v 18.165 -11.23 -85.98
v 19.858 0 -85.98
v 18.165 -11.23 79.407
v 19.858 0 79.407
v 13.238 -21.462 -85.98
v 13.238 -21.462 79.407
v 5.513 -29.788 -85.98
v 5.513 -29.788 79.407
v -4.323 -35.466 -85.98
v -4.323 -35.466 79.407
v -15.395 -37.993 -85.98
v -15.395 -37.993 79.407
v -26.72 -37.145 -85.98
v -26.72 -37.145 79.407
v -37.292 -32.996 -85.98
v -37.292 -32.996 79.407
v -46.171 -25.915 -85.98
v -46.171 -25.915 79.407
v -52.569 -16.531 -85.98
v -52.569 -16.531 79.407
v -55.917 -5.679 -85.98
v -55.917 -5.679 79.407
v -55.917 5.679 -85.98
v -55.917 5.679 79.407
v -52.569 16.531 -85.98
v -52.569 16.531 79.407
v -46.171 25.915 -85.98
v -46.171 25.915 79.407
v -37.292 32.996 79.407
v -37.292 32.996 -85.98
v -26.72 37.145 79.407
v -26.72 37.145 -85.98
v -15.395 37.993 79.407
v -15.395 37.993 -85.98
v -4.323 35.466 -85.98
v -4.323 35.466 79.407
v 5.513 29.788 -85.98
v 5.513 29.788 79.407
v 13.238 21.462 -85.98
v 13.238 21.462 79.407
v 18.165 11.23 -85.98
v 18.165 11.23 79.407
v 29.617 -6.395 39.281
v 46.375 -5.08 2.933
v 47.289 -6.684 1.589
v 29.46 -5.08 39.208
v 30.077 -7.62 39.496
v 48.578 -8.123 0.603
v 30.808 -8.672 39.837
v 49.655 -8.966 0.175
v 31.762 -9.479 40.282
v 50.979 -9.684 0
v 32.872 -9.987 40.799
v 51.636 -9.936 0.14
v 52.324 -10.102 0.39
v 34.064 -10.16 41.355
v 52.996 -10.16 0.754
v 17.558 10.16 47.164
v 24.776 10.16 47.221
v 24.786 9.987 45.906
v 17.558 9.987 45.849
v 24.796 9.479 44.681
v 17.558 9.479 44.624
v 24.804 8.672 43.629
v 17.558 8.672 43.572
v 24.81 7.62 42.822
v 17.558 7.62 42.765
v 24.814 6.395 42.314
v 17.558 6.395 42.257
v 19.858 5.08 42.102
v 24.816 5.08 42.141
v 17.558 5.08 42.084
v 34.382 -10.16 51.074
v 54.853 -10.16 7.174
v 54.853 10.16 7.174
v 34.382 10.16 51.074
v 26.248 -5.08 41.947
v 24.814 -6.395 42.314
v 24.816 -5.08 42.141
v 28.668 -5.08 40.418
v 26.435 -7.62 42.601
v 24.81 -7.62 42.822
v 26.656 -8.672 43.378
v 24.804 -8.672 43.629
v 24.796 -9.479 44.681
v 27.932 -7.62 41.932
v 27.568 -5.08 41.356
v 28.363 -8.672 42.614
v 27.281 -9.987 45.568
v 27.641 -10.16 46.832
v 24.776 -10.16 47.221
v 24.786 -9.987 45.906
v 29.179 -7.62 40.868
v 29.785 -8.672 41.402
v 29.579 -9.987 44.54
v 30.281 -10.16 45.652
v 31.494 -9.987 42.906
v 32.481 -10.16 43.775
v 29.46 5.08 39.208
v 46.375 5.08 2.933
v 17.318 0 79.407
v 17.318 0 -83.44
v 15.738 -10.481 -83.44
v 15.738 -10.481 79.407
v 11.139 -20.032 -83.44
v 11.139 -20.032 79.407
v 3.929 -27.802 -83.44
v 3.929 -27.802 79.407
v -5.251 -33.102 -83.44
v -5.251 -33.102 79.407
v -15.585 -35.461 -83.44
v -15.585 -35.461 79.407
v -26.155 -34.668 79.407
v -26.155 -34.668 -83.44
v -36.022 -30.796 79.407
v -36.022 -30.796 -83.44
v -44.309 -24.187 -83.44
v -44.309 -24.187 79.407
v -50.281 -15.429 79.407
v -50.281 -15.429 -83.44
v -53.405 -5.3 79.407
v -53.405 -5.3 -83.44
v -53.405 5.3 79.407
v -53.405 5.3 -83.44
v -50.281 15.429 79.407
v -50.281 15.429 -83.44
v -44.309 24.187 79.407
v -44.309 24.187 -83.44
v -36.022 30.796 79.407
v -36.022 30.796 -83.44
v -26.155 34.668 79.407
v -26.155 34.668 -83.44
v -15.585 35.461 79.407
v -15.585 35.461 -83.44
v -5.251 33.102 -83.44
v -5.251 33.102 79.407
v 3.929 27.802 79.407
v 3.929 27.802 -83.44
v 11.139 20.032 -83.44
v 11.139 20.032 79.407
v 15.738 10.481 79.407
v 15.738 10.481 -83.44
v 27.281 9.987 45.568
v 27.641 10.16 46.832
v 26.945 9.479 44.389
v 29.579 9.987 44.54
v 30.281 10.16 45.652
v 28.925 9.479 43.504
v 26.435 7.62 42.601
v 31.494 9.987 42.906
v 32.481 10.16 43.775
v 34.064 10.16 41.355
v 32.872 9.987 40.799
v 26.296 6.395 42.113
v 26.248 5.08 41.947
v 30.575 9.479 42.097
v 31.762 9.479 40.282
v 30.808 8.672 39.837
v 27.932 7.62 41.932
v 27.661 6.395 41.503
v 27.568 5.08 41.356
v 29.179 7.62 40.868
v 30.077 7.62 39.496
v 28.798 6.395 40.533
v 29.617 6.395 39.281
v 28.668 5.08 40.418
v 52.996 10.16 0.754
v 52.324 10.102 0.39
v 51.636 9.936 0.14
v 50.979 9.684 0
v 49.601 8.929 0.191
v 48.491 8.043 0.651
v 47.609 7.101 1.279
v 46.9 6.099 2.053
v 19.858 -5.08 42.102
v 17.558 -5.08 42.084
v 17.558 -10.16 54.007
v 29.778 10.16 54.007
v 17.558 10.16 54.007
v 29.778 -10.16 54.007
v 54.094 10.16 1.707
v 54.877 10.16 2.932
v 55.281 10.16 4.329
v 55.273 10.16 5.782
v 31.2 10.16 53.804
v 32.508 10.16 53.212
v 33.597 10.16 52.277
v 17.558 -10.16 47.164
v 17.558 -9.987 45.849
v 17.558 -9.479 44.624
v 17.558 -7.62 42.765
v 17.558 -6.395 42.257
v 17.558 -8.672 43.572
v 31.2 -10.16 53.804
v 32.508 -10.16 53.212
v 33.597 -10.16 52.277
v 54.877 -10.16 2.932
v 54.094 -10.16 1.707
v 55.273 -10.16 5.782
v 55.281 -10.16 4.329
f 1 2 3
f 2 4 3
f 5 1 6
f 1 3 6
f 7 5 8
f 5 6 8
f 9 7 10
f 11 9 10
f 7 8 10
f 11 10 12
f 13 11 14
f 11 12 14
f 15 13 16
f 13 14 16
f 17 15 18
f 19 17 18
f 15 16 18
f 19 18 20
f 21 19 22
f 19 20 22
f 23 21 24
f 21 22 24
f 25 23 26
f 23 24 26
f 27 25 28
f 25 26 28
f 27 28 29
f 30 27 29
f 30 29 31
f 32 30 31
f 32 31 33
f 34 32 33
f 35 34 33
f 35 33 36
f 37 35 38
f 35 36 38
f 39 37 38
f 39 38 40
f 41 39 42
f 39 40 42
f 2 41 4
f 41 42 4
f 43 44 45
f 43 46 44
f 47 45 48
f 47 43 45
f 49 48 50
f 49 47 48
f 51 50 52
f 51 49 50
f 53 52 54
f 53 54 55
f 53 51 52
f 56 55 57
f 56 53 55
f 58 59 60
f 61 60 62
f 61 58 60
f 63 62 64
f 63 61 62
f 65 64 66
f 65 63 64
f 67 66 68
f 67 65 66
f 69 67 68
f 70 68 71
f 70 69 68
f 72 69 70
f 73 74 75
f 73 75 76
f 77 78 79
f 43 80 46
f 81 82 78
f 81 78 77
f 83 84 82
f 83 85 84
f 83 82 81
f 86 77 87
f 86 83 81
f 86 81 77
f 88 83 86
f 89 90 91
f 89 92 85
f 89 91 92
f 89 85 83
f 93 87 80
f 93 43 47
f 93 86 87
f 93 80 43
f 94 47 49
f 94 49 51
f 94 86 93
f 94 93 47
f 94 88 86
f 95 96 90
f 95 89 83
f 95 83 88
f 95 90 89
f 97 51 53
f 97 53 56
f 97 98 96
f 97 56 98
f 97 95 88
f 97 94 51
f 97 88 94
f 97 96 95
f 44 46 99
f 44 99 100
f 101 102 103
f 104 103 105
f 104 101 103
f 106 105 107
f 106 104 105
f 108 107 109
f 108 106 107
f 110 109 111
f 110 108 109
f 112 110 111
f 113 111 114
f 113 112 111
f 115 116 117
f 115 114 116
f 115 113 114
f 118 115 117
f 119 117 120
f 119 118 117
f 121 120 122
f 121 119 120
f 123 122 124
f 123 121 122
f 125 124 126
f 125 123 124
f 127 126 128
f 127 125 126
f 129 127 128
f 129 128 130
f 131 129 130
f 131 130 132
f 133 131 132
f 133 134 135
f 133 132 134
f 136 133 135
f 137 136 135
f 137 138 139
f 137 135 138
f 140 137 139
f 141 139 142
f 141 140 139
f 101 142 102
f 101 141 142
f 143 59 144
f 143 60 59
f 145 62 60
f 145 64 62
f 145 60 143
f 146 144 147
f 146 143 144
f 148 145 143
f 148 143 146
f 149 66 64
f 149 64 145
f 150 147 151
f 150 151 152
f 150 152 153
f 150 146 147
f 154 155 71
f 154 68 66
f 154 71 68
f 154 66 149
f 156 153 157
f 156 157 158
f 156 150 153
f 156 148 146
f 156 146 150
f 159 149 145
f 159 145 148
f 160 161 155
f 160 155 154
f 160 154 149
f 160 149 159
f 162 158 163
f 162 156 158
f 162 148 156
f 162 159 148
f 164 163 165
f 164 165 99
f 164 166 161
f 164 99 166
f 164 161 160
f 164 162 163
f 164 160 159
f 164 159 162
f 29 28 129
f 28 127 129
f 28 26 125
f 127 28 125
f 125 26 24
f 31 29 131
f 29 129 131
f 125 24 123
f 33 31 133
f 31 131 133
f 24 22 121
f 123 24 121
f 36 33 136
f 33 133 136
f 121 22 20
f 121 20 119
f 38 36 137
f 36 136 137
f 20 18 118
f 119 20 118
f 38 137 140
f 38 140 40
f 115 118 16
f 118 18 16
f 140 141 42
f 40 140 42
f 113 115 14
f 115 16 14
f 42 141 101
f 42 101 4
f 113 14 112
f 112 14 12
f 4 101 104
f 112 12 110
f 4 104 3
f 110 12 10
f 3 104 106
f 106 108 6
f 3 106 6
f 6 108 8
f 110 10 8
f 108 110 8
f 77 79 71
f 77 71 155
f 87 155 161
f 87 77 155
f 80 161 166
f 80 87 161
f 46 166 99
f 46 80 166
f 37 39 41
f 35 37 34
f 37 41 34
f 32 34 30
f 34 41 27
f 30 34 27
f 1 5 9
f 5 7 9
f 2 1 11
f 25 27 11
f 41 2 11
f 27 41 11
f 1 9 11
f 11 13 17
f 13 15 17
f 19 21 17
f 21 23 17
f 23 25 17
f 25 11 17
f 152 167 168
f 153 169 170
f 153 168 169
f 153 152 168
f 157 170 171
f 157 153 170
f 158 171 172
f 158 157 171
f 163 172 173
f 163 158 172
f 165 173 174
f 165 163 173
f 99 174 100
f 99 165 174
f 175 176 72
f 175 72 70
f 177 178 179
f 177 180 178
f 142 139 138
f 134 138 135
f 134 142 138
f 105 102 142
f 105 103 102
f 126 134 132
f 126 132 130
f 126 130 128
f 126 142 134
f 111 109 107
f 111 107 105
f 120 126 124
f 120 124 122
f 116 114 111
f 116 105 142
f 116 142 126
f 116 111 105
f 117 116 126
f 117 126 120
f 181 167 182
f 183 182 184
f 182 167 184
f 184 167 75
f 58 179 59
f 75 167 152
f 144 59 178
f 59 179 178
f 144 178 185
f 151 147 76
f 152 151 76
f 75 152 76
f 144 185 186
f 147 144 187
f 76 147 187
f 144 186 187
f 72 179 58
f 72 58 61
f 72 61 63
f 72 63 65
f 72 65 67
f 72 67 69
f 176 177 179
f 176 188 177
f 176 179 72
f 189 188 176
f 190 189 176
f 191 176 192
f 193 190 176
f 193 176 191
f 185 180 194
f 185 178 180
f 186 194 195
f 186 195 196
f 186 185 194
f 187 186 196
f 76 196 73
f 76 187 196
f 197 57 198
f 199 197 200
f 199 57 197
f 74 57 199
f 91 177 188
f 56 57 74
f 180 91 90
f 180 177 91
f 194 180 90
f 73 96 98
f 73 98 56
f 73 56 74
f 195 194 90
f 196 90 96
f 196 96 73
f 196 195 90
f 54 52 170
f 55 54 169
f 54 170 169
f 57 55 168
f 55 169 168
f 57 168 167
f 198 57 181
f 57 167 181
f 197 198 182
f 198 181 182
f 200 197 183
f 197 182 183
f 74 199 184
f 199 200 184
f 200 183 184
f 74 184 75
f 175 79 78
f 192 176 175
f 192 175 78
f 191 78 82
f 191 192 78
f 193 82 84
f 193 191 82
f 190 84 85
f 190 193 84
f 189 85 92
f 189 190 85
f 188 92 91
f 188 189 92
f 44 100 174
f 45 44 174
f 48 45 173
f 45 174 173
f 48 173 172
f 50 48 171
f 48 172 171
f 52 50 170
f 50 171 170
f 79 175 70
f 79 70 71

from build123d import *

# Parameters (mm, degrees)
F2_DEPTH    = 10.16
F3_R        = 5.08
F4_T        = -2.54
F5_R        = 5.08
F6_R        = 5.08
F7_T1_DEPTH = 59.8990400144
F9_T1_DEPTH = 52.7251544051
F9_T3_DEPTH = 19.9575926883
F9_T6_ANGLE = 65.45
F9_T8_ANGLE = 65.45


# Not quite as in the source:
# - a fillet or chamfer that OpenCascade refuses, or shapes differently, is made with other operations: its cross-section is extruded or revolved along the edge and cut away or added
# - a feature of the source that left no trace in its solid (it failed there, or was rolled back) is left out


with BuildPart() as f1:
    # F0 (on Front) → F1 (revolve)
    with BuildSketch(Plane.XZ):
        Polygon((19.8578521456, 79.4071055293), (-18.2421478544, 79.4071055293), (-18.2421478544, -85.9799182087), (19.8578521456, -85.9799182087), (19.8578521456, 42.1022108057), (17.5583876607, 42.0841504825), (17.5583876607, 54.0071055293), (19.8578521456, 54.0071055293), align=None)
        Polygon((19.8578521456, 42.1022108057), (19.8578521456, 54.0071055293), (17.5583876607, 54.0071055293), (17.5583876607, 42.0841504825), align=None)
    revolve(axis=Axis((-18.2421478544, 0, -3.2864063397), (0, 0, -1)))

    # F4
    f4_openings = [f1.faces().sort_by_distance(p)[0] for p in [
        (-18.242148, 0, 79.407106),
    ]]
    offset(amount=F4_T, openings=f4_openings)


with BuildPart() as f2:
    # F0 (on Front) → F2 (new body, symmetric)
    with BuildSketch(Plane.XZ):
        Polygon((33.0144607576, 54.0071055293), (19.8578521456, 54.0071055293), (19.8578521456, 42.1022108057), (28.0800888653, 42.1667894297), (47.7427856962, 0), (58.1983876607, 0), align=None)
        Polygon((19.8578521456, 42.1022108057), (19.8578521456, 54.0071055293), (17.5583876607, 54.0071055293), (17.5583876607, 42.0841504825), align=None)
    extrude(amount=F2_DEPTH, both=True)

    # F3
    f3_edges = [f2.edges().sort_by_distance(p)[0] for p in [
        (33.014461, 0, 54.007106),
    ]]
    fillet(f3_edges, radius=F3_R)

    # F5
    f5_edges = [f2.edges().sort_by_distance(p)[0] for p in [
        (28.080089, 0, 42.166789),
    ]]
    fillet(f5_edges, radius=F5_R)

    # F6
    f6_edges = [f2.edges().sort_by_distance(p)[0] for p in [
        (47.742786, 0, 0),
    ]]
    fillet(f6_edges, radius=F6_R)

    # F7: fillet of radius 5.08 on 1 edges, made by hand

    # F7_s2 → F7_t1 (cut)
    with BuildSketch(Plane.XZ.offset(-29.9495200072)):
        with BuildLine():
            ThreePointArc((50.9791026211, 0), (54.7189312044, 2.6135617341), (54.8530226422, 7.1741584337))
            Line((54.8530226422, 7.1741584337), (58.1983876607, 0))
            Line((58.1983876607, 0), (50.9791026211, 0))
        make_face()
    extrude(amount=F7_T1_DEPTH, mode=Mode.SUBTRACT)

    # F9: fillet of radius 5.08 on 6 edges, made by hand

    # F9_s2 → F9_t1 (cut)
    with BuildSketch(Plane(origin=(-9.7559305144, 0, 20.9216605042), x_dir=(0, 1, 0), z_dir=(0.4226182617, 0, -0.906307787))):
        with BuildLine():
            ThreePointArc((10.16, 48.3496584513), (8.6721024484, 44.7575560028), (5.08, 43.2696584513))
            Line((5.08, 43.2696584513), (10.16, 43.2696584513))
            Line((10.16, 43.2696584513), (10.16, 48.3496584513))
        make_face()
        with BuildLine():
            ThreePointArc((-5.08, 43.2696584513), (-8.6721024484, 44.7575560028), (-10.16, 48.3496584513))
            Line((-10.16, 48.3496584513), (-10.16, 43.2696584513))
            Line((-10.16, 43.2696584513), (-5.08, 43.2696584513))
        make_face()
    extrude(amount=F9_T1_DEPTH, mode=Mode.SUBTRACT)

    # F9_s4 → F9_t3 (cut)
    with BuildSketch(Plane(origin=(5.1882108439, 0, 0.0407489506), x_dir=(0, 1, 0), z_dir=(0.9999691576, 0, 0.0078539009))):
        with BuildLine():
            ThreePointArc((10.16, 47.0249506718), (8.6721024484, 43.4328482233), (5.08, 41.9449506718))
            Line((5.08, 41.9449506718), (10.16, 41.9449506718))
            Line((10.16, 41.9449506718), (10.16, 47.0249506718))
        make_face()
        with BuildLine():
            ThreePointArc((-5.08, 41.9449506718), (-8.6721024484, 43.4328482233), (-10.16, 47.0249506718))
            Line((-10.16, 47.0249506718), (-10.16, 41.9449506718))
            Line((-10.16, 41.9449506718), (-5.08, 41.9449506718))
        make_face()
    extrude(amount=F9_T3_DEPTH, mode=Mode.SUBTRACT)

    # F9_s5 → F9_t6 (revolve, cut)
    with BuildSketch(Plane(origin=(25.1451879931, 0, 0.1974939055), x_dir=(0, 1, 0), z_dir=(-0.9999691576, 0, -0.0078539009))):
        with BuildLine():
            ThreePointArc((10.16, -47.0249506718), (8.6721024484, -43.4328482233), (5.08, -41.9449506718))
            Line((5.08, -41.9449506718), (10.16, -41.9449506718))
            Line((10.16, -41.9449506718), (10.16, -47.0249506718))
        make_face()
    revolve(axis=Axis((24.8556543242, 10.16, 37.0613075754), (0, 1, 0)), revolution_arc=F9_T6_ANGLE, mode=Mode.SUBTRACT)

    # F9_s7 → F9_t8 (revolve, cut)
    with BuildSketch(Plane(origin=(25.1451879931, 0, 0.1974939055), x_dir=(0, 1, 0), z_dir=(-0.9999691576, 0, -0.0078539009))):
        with BuildLine():
            ThreePointArc((-5.08, -41.9449506718), (-8.6721024484, -43.4328482233), (-10.16, -47.0249506718))
            Line((-10.16, -47.0249506718), (-10.16, -41.9449506718))
            Line((-10.16, -41.9449506718), (-5.08, -41.9449506718))
        make_face()
    revolve(axis=Axis((24.8556543242, -10.16, 37.0613075754), (0, 1, 0)), revolution_arc=F9_T8_ANGLE, mode=Mode.SUBTRACT)


solid = Compound([f1.part, f2.part])
